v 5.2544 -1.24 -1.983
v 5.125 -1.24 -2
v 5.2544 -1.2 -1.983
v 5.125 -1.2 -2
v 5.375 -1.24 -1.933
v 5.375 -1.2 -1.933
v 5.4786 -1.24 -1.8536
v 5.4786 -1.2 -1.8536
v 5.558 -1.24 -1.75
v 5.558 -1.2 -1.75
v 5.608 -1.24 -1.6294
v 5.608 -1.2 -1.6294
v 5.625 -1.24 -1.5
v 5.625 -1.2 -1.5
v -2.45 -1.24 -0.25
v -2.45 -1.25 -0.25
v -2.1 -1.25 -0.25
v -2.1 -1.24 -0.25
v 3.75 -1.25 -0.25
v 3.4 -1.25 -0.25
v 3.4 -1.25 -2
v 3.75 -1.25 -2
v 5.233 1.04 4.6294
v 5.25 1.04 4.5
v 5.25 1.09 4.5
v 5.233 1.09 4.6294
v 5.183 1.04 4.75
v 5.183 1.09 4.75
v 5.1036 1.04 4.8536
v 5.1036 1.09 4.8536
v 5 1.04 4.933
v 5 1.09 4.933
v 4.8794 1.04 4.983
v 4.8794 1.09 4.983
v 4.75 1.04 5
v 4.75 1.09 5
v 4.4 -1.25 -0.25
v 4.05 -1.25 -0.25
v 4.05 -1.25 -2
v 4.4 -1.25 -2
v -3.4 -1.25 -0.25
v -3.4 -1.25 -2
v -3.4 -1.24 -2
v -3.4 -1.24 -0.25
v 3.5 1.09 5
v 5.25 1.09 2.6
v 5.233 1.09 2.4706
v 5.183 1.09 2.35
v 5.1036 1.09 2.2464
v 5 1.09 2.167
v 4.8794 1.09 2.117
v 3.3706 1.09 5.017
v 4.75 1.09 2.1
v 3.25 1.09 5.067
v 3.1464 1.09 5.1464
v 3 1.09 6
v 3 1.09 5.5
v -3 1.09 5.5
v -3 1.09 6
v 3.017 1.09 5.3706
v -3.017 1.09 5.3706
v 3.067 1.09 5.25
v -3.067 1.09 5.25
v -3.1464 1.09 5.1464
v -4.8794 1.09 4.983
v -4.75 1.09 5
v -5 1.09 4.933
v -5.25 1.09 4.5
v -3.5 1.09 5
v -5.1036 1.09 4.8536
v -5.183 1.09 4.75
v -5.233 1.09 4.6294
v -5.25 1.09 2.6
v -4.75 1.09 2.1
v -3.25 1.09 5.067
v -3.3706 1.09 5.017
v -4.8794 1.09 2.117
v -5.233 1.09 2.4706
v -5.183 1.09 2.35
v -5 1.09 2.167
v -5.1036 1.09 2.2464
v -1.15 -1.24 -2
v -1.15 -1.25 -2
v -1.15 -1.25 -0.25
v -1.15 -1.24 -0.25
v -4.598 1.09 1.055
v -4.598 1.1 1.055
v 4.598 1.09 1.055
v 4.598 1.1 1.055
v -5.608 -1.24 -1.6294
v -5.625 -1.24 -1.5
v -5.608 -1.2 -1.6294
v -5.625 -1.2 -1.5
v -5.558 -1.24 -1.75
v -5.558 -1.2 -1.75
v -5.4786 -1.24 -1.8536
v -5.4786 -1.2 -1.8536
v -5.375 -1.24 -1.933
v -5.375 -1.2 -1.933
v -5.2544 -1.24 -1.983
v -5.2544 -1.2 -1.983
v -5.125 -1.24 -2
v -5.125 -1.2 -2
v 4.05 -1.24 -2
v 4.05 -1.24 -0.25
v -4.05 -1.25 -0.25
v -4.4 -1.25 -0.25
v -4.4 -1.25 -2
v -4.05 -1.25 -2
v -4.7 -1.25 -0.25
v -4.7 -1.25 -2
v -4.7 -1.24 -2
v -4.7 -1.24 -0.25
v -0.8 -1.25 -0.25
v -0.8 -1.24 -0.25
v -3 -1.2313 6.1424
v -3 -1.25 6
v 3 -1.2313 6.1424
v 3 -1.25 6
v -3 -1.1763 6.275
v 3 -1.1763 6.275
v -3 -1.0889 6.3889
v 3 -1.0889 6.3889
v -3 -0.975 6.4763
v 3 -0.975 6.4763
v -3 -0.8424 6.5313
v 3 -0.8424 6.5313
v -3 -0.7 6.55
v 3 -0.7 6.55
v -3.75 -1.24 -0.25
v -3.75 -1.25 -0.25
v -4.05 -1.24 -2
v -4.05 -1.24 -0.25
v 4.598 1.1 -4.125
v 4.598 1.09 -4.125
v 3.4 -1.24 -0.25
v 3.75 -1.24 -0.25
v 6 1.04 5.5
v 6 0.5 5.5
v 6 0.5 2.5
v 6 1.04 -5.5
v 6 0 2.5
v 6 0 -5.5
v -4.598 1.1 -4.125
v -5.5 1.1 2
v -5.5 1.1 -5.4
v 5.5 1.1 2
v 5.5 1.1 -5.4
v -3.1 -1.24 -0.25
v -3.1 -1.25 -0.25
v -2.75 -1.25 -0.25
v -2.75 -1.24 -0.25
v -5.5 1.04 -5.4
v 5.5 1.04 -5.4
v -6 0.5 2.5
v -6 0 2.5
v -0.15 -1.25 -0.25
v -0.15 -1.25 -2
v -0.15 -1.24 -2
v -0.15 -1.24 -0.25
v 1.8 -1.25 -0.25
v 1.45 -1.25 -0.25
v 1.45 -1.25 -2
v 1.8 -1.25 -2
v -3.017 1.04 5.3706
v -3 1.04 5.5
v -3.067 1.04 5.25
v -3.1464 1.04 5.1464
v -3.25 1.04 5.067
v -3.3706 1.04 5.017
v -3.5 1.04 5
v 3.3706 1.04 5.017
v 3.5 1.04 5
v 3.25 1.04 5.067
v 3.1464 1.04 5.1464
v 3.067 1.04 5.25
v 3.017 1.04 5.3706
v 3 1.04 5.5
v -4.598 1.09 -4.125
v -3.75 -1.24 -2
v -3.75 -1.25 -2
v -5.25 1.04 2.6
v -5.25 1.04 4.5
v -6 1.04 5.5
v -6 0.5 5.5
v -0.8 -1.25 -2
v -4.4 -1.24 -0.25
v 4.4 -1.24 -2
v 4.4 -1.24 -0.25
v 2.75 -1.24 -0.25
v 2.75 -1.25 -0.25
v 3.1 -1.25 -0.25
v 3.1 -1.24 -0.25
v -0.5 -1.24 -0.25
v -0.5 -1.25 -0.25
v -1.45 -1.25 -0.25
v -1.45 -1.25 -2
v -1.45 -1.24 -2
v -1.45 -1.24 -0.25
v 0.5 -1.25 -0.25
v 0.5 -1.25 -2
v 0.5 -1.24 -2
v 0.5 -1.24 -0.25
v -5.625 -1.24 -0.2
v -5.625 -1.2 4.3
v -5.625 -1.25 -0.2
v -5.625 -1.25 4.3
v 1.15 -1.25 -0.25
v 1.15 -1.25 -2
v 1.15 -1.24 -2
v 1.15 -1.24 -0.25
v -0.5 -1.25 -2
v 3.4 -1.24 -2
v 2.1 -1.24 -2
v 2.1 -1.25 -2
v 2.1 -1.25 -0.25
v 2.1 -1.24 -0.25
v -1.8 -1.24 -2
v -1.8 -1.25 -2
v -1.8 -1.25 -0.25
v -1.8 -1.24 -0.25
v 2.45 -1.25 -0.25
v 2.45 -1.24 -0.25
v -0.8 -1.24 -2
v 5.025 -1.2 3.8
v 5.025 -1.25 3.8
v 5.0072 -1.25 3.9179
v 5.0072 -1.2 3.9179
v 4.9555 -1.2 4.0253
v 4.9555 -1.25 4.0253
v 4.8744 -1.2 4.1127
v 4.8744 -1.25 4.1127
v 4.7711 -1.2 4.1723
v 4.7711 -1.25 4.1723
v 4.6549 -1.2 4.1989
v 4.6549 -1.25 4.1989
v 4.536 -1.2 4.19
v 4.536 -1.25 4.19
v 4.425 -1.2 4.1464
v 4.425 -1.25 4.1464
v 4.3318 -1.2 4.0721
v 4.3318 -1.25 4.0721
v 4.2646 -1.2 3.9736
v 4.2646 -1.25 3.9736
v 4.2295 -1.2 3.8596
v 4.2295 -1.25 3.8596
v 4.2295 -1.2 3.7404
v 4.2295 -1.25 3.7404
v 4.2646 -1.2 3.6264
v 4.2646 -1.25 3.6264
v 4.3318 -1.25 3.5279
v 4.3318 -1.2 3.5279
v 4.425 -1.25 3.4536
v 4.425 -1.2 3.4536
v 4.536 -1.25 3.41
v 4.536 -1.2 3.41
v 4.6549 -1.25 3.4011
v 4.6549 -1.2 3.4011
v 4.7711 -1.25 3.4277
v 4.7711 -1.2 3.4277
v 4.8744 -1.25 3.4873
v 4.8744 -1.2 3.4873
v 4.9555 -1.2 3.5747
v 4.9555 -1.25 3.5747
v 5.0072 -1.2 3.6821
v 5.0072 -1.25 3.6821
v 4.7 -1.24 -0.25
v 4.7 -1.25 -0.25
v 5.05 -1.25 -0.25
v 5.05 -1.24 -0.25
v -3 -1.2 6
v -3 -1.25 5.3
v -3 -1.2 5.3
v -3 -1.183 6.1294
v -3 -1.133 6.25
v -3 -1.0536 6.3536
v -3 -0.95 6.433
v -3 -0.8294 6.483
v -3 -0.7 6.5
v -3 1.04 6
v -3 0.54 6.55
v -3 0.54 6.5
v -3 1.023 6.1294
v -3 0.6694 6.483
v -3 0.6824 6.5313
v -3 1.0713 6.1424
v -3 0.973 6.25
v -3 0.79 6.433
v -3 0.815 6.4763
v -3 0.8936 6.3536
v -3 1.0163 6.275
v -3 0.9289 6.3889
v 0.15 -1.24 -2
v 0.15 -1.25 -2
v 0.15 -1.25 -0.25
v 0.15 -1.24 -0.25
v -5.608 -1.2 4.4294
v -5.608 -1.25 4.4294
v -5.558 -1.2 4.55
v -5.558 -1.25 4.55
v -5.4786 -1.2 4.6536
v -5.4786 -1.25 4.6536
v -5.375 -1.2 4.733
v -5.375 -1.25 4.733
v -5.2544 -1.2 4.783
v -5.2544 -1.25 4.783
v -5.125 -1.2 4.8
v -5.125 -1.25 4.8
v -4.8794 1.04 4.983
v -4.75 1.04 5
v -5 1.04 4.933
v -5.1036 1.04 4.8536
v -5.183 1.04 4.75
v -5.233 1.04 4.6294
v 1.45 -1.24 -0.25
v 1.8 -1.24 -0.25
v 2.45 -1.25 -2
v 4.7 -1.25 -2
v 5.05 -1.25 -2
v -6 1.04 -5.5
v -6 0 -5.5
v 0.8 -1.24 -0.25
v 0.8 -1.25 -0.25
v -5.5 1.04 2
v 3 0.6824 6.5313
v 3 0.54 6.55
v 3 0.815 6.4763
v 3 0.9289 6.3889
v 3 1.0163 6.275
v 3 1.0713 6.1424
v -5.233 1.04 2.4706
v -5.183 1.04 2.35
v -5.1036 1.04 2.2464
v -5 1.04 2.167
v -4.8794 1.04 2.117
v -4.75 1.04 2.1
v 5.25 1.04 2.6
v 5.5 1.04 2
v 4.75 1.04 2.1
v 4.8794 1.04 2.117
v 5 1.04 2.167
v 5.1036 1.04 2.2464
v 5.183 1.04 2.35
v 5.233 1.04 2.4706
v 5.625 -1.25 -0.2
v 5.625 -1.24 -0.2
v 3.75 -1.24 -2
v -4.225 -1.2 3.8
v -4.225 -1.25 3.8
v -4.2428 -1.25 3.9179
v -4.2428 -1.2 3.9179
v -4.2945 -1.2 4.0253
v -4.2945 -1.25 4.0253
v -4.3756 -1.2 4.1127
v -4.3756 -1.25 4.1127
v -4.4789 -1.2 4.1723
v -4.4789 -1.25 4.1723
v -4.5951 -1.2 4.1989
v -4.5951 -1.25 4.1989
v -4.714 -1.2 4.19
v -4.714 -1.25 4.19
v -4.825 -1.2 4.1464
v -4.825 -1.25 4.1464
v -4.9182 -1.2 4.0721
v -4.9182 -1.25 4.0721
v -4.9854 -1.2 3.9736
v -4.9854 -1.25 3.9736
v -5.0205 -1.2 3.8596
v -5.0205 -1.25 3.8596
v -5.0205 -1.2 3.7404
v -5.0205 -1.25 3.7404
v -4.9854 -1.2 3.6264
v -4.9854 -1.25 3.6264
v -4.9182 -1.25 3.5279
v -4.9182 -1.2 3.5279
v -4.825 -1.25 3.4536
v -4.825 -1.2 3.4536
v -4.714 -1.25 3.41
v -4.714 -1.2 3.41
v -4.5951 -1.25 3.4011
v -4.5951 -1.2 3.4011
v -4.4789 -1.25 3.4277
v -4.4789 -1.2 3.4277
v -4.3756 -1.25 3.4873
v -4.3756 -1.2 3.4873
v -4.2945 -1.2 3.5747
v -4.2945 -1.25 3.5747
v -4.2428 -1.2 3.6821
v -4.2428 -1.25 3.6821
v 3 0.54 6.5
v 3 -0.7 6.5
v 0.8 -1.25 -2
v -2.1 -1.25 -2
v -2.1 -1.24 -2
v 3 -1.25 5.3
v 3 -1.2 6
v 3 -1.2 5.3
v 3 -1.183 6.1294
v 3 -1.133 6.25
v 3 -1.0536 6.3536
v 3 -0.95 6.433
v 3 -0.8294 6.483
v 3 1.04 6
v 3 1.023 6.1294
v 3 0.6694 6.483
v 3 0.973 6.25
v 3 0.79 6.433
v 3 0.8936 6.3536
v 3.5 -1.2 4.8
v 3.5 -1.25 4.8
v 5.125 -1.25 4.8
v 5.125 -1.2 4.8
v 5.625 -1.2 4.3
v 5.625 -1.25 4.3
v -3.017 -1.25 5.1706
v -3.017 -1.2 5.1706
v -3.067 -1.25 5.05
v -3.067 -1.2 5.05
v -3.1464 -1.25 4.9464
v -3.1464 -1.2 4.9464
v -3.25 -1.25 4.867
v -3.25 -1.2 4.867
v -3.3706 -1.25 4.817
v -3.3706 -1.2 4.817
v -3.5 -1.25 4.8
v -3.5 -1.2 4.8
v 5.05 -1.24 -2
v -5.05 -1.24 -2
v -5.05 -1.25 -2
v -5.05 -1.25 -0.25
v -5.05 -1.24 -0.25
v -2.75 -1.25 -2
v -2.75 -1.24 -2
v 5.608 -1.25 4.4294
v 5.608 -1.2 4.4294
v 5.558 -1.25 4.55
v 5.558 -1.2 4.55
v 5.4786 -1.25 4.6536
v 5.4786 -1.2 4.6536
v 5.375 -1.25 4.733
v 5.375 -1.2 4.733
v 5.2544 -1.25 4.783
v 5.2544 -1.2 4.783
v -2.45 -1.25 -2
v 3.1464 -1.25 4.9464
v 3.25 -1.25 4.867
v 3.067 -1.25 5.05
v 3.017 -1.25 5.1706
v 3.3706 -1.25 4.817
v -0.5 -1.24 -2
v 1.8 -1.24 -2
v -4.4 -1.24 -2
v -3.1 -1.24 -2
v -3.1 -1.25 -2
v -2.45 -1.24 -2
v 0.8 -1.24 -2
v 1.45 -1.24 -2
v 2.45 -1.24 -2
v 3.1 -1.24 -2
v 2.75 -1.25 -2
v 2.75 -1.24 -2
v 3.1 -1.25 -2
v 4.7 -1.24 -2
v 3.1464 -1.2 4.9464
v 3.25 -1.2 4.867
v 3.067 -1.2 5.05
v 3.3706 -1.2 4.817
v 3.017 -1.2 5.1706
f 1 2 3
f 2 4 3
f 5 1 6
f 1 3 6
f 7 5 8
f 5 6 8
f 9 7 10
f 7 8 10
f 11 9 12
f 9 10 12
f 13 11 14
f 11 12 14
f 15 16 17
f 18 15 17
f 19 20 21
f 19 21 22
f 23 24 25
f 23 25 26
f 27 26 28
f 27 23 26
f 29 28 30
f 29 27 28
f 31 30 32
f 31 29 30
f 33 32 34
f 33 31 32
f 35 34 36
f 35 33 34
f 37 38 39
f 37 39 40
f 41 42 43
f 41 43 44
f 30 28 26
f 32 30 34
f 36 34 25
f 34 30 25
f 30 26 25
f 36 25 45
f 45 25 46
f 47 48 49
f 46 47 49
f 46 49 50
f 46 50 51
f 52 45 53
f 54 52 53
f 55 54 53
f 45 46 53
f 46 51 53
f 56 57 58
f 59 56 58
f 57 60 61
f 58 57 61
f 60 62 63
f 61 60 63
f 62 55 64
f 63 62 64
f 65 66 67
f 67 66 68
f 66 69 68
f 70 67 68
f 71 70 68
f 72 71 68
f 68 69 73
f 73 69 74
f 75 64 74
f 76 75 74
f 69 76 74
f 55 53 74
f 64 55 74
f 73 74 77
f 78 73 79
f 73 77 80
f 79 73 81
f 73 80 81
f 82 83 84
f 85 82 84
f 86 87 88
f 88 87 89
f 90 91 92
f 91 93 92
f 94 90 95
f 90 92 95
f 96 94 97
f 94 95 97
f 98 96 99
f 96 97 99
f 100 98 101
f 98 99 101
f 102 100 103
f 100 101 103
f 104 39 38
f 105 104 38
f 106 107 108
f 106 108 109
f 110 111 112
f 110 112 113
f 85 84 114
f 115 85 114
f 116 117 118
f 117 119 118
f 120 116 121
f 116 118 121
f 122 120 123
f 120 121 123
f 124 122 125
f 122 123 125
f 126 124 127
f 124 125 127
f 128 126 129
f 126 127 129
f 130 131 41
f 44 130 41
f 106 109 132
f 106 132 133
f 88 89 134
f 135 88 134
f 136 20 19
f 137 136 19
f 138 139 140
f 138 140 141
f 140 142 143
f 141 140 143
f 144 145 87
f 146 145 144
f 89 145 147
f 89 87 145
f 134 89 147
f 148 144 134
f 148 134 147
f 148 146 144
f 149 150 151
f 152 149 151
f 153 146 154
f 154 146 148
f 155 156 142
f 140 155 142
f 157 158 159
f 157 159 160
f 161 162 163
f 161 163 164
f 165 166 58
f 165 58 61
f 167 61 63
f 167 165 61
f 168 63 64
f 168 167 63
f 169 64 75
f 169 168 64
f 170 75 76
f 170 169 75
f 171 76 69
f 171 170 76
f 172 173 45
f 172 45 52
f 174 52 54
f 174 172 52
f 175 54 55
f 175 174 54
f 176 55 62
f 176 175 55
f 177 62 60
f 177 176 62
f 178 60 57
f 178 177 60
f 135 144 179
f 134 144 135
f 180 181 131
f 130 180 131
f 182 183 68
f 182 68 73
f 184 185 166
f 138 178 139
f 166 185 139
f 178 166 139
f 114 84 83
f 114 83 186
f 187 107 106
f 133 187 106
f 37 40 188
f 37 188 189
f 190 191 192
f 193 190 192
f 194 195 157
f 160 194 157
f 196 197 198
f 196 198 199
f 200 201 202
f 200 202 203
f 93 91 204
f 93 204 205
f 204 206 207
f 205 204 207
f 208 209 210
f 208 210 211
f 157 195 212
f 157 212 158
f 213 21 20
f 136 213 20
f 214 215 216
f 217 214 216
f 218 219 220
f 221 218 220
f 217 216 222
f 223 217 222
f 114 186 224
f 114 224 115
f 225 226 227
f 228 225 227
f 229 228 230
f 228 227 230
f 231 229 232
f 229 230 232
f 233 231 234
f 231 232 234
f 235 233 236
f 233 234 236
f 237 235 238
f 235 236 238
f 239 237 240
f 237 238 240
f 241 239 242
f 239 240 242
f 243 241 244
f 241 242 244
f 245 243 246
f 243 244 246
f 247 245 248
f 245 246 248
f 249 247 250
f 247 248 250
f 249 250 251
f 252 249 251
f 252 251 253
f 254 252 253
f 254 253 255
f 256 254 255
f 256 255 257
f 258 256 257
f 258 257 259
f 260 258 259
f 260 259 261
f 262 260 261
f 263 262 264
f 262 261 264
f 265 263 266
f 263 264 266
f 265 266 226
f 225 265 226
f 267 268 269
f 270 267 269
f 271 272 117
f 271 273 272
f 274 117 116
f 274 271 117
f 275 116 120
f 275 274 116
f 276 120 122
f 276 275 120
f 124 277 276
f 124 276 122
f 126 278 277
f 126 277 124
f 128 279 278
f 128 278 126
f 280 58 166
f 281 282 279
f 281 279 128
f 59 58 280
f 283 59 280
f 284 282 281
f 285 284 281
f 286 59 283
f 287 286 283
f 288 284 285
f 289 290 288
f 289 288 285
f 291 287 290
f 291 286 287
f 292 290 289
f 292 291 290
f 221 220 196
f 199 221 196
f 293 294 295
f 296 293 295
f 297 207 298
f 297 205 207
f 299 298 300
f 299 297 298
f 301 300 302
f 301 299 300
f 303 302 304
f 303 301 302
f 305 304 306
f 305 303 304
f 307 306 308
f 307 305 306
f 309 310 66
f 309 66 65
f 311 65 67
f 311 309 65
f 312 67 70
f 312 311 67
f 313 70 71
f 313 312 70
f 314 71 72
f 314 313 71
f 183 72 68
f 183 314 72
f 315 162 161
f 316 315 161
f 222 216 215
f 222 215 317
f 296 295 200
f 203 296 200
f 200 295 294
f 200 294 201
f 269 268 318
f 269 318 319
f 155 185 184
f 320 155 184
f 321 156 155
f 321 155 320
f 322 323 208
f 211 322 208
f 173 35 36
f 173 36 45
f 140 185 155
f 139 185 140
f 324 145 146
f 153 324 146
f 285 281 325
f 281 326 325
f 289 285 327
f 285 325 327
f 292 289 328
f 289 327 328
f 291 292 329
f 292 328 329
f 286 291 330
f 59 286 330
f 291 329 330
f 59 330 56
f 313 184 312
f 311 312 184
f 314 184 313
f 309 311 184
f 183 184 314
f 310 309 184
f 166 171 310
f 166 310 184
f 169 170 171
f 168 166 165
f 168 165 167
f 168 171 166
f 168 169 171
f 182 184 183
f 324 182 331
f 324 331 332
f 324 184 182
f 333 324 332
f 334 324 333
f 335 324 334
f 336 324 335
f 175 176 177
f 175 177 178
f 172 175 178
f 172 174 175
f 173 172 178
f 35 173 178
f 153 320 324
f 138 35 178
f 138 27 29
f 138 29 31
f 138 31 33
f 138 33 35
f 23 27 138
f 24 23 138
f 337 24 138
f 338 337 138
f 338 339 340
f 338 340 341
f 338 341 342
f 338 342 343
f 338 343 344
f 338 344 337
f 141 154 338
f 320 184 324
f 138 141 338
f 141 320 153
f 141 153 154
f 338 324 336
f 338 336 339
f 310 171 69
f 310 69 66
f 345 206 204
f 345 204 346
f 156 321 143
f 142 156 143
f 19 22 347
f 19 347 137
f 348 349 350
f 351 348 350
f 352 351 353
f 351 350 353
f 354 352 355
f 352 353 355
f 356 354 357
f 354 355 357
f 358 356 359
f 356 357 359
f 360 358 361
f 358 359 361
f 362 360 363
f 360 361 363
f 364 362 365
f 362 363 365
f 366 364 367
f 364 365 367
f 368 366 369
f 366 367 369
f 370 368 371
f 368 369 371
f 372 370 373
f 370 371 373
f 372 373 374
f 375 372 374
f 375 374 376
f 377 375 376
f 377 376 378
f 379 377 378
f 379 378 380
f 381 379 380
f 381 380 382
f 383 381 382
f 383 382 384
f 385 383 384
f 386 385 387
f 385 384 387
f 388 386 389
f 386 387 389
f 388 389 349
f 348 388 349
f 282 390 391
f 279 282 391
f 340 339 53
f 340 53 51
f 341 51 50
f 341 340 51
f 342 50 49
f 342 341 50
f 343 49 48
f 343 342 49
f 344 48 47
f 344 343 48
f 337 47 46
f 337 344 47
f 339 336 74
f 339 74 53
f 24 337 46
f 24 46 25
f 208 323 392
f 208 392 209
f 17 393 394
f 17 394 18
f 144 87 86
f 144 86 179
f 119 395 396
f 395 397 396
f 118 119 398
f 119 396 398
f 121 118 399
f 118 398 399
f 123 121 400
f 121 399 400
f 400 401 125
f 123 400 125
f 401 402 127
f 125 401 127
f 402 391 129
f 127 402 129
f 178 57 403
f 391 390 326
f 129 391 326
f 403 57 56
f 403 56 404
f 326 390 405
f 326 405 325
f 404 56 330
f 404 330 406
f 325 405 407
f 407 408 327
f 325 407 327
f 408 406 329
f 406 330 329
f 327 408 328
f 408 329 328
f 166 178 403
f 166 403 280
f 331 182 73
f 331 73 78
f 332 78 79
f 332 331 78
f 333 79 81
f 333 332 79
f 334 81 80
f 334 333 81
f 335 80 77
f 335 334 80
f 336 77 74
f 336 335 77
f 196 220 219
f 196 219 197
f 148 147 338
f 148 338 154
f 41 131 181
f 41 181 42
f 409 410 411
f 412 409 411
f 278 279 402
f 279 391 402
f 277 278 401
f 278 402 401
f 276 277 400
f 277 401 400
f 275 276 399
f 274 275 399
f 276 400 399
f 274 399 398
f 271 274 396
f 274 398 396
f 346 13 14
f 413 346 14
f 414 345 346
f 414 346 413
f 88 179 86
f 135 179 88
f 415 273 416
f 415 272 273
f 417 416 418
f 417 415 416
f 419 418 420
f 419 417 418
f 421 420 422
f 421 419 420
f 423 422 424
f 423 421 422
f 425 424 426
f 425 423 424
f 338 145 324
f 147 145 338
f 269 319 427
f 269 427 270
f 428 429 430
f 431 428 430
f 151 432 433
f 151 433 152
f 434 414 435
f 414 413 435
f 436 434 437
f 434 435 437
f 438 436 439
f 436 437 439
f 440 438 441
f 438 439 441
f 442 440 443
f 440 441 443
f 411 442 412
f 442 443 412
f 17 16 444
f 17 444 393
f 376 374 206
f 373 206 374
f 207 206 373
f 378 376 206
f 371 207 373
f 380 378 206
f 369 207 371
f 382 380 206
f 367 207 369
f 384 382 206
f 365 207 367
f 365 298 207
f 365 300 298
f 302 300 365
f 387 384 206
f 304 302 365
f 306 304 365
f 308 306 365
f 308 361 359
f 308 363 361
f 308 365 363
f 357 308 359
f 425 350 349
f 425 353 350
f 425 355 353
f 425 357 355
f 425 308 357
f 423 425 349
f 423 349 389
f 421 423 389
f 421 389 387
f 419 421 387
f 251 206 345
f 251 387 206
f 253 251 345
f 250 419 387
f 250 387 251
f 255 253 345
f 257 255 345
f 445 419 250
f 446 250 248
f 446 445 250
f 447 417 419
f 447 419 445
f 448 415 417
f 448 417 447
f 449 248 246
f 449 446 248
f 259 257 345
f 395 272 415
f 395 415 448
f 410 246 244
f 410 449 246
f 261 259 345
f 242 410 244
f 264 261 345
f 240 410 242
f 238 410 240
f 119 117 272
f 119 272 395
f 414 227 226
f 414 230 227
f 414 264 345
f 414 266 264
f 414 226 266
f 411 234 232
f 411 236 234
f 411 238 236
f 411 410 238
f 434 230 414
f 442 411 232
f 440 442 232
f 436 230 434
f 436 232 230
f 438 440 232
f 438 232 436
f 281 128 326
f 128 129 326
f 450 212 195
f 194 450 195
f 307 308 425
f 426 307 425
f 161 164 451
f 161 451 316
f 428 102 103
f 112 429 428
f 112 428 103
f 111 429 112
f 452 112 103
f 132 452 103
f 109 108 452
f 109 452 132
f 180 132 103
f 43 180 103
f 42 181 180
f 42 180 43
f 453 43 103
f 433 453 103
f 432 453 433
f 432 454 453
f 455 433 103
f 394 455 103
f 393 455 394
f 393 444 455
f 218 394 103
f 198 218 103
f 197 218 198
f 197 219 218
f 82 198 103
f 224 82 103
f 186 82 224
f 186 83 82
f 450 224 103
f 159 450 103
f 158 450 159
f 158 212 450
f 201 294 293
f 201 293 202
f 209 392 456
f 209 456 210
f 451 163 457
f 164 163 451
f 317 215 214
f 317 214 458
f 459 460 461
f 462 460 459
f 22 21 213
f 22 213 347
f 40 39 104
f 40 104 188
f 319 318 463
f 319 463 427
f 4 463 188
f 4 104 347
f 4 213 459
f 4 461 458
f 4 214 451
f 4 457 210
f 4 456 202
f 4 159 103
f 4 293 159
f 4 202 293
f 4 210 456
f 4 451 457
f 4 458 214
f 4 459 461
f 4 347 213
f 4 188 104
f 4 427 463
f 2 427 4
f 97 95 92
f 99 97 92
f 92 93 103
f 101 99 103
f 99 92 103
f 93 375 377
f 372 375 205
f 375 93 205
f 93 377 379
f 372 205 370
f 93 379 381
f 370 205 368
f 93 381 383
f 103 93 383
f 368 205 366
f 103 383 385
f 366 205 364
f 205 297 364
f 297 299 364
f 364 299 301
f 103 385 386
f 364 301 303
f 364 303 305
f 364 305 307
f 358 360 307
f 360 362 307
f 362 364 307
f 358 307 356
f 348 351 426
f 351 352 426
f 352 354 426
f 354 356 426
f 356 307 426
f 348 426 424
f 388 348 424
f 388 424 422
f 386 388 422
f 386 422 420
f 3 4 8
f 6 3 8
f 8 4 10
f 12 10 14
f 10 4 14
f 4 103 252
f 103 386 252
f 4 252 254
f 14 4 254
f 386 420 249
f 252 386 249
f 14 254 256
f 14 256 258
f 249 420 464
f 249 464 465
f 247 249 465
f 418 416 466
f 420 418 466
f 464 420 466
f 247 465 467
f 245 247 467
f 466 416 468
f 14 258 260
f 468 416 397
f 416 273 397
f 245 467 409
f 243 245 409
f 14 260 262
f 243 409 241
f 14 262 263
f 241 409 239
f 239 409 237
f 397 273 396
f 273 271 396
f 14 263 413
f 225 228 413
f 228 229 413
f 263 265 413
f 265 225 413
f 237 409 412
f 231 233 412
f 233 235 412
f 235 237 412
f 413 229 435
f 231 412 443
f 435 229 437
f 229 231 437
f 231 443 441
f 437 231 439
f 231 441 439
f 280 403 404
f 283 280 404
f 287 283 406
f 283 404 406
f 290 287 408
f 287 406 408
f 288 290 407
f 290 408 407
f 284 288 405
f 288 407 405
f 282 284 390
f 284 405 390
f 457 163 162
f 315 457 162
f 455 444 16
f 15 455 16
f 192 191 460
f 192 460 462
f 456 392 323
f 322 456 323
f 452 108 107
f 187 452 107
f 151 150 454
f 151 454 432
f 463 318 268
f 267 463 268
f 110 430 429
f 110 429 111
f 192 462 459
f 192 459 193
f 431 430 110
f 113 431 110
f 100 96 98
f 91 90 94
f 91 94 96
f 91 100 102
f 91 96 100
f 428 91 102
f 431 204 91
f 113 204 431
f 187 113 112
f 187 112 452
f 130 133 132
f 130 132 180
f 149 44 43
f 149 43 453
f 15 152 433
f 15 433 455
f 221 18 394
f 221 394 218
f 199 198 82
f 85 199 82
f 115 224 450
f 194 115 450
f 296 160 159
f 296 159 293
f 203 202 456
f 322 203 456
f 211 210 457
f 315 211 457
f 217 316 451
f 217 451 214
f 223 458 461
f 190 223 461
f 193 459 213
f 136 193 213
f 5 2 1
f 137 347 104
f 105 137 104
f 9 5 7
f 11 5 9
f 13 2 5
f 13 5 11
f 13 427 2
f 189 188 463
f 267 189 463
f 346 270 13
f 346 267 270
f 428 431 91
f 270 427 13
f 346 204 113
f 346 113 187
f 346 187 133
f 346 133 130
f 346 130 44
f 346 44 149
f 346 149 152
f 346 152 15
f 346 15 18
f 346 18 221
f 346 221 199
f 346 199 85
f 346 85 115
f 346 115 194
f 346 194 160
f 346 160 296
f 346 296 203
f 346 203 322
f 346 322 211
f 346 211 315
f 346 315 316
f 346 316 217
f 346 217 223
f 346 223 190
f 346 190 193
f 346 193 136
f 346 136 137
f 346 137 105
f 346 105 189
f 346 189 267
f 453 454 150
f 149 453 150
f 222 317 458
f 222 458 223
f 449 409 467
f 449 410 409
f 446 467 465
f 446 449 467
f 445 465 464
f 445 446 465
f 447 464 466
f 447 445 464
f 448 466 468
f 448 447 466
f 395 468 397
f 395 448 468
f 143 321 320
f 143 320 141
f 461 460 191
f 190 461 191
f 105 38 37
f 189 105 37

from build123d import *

# Parameters (mm, degrees)
SKETCH1_W           = 12
SKETCH1_H           = 11
BOSS_EXTRUDE1_DEPTH = 1.1
SKETCH2_W           = 12
SKETCH2_H           = 11
SKETCH2_W_2         = 11
SKETCH2_H_2         = 7.4
CUT_EXTRUDE1_DEPTH  = 0.06
SKETCH3_W           = 9.196
SKETCH3_H           = 5.18
CUT_EXTRUDE2_DEPTH  = 0.01
SKETCH4_W           = 12
SKETCH4_H           = 3
CUT_EXTRUDE3_DEPTH  = 0.5
BOSS_EXTRUDE2_DEPTH = 0.05
BOSS_EXTRUDE3_DEPTH = 3
SKETCH7_W           = 11.25
SKETCH7_H           = 6.8
SKETCH7_R           = 0.4
BOSS_EXTRUDE4_DEPTH = 0.05
SKETCH8_W           = 0.3
SKETCH8_H           = 1.8
SKETCH8_W_2         = 0.575
CUT_EXTRUDE4_DEPTH  = 0.01
SKETCH10_W          = 10.1
SKETCH10_H          = 0.05
CUT_EXTRUDE5_DEPTH  = 0.01
FILLET1_R           = 0.5


with BuildPart() as part:
    # Sketch1 → Boss-Extrude1 (new body)
    with BuildSketch(Plane(origin=(0, 0, 0), x_dir=(1, 0, 0), z_dir=(0, 1, 0))):
        Rectangle(SKETCH1_W, SKETCH1_H)
    extrude(amount=BOSS_EXTRUDE1_DEPTH)

    # Sketch2 → Cut-Extrude1 (cut)
    with BuildSketch(Plane(origin=(0, 1.1, 0), x_dir=(1, 0, 0), z_dir=(0, 1, 0))):
        Rectangle(SKETCH2_W, SKETCH2_H)
        with Locations((0, 1.7)):
            Rectangle(SKETCH2_W_2, SKETCH2_H_2, mode=Mode.SUBTRACT)
    extrude(amount=-CUT_EXTRUDE1_DEPTH, mode=Mode.SUBTRACT)

    # Sketch3 → Cut-Extrude2 (cut)
    with BuildSketch(Plane(origin=(0, 1.1, 0), x_dir=(1, 0, 0), z_dir=(0, 1, 0))):
        with Locations((0, 1.535)):
            Rectangle(SKETCH3_W, SKETCH3_H)
    extrude(amount=-CUT_EXTRUDE2_DEPTH, mode=Mode.SUBTRACT)

    # Sketch4 → Cut-Extrude3 (cut)
    with BuildSketch(Plane.XZ):
        with Locations((0, 4)):
            Rectangle(SKETCH4_W, SKETCH4_H)
    extrude(amount=-CUT_EXTRUDE3_DEPTH, mode=Mode.SUBTRACT)

    # Sketch5 → Boss-Extrude2 (add)
    with BuildSketch(Plane(origin=(0, 1.04, 0), x_dir=(1, 0, 0), z_dir=(0, 1, 0))):
        with BuildLine():
            Line((-4.75, -2.1), (4.75, -2.1))
            ThreePointArc((4.75, -2.1), (5.103553391, -2.246446609), (5.25, -2.6))
            Line((5.25, -2.6), (5.25, -4.5))
            ThreePointArc((5.25, -4.5), (5.103553391, -4.853553391), (4.75, -5))
            Line((4.75, -5), (3.5, -5))
            ThreePointArc((3.5, -5), (3.146446609, -5.146446609), (3, -5.5))
            Line((3, -5.5), (3, -6))
            Line((3, -6), (-3, -6))
            Line((-3, -6), (-3, -5.5))
            ThreePointArc((-3, -5.5), (-3.146446609, -5.146446609), (-3.5, -5))
            Line((-3.5, -5), (-4.75, -5))
            ThreePointArc((-4.75, -5), (-5.103553391, -4.853553391), (-5.25, -4.5))
            Line((-5.25, -4.5), (-5.25, -2.6))
            ThreePointArc((-5.25, -2.6), (-5.103553391, -2.246446609), (-4.75, -2.1))
        make_face()
    extrude(amount=BOSS_EXTRUDE2_DEPTH)

    # Sketch6 → Boss-Extrude3 (add, symmetric)
    with BuildSketch(Plane(origin=(0, 0, 0), x_dir=(0, 0, -1), z_dir=(1, 0, 0))):
        with BuildLine():
            Line((-6.5, 0.54), (-6.5, -0.7))
            ThreePointArc((-6.5, -0.7), (-6.353553391, -1.053553391), (-6, -1.2))
            Line((-6, -1.2), (2, -1.2))
            Line((2, -1.2), (2, -1.25))
            Line((2, -1.25), (-6, -1.25))
            ThreePointArc((-6, -1.25), (-6.38890873, -1.08890873), (-6.55, -0.7))
            Line((-6.55, -0.7), (-6.55, 0.54))
            ThreePointArc((-6.55, 0.54), (-6.38890873, 0.92890873), (-6, 1.09))
            Line((-6, 1.09), (-6, 1.04))
            ThreePointArc((-6, 1.04), (-6.353553391, 0.893553391), (-6.5, 0.54))
        make_face()
    extrude(amount=BOSS_EXTRUDE3_DEPTH, both=True)

    # Sketch7 → Boss-Extrude4 (add)
    with BuildSketch(Plane.XZ.offset(1.25)):
        with Locations((0, 1.4)):
            Rectangle(SKETCH7_W, SKETCH7_H)
        with Locations((-4.625, 3.8)):
            Circle(SKETCH7_R, mode=Mode.SUBTRACT)
        with Locations((4.625, 3.8)):
            Circle(SKETCH7_R, mode=Mode.SUBTRACT)
    extrude(amount=-BOSS_EXTRUDE4_DEPTH)

    # Sketch8 → Cut-Extrude4 (cut)
    with BuildSketch(Plane.XZ.offset(1.25)):
        with Locations((0, -1.1)):
            Rectangle(SKETCH8_W, SKETCH8_H)
        with Locations((0.65, -1.1)):
            Rectangle(SKETCH8_W, SKETCH8_H)
        with Locations((1.3, -1.1)):
            Rectangle(SKETCH8_W, SKETCH8_H)
        with Locations((1.95, -1.1)):
            Rectangle(SKETCH8_W, SKETCH8_H)
        with Locations((2.6, -1.1)):
            Rectangle(SKETCH8_W, SKETCH8_H)
        with Locations((3.25, -1.1)):
            Rectangle(SKETCH8_W, SKETCH8_H)
        with Locations((3.9, -1.1)):
            Rectangle(SKETCH8_W, SKETCH8_H)
        with Locations((4.55, -1.1)):
            Rectangle(SKETCH8_W, SKETCH8_H)
        with Locations((-4.55, -1.1)):
            Rectangle(SKETCH8_W, SKETCH8_H)
        with Locations((-3.9, -1.1)):
            Rectangle(SKETCH8_W, SKETCH8_H)
        with Locations((-3.25, -1.1)):
            Rectangle(SKETCH8_W, SKETCH8_H)
        with Locations((-2.6, -1.1)):
            Rectangle(SKETCH8_W, SKETCH8_H)
        with Locations((-1.95, -1.1)):
            Rectangle(SKETCH8_W, SKETCH8_H)
        with Locations((-1.3, -1.1)):
            Rectangle(SKETCH8_W, SKETCH8_H)
        with Locations((-0.65, -1.1)):
            Rectangle(SKETCH8_W, SKETCH8_H)
        with Locations((5.3375, -1.1)):
            Rectangle(SKETCH8_W_2, SKETCH8_H)
        with Locations((-5.3375, -1.1)):
            Rectangle(SKETCH8_W_2, SKETCH8_H)
    extrude(amount=-CUT_EXTRUDE4_DEPTH, mode=Mode.SUBTRACT)

    # Sketch10 → Cut-Extrude5 (cut)
    with BuildSketch(Plane.XZ.offset(1.25)):
        with Locations((0, -0.225)):
            Rectangle(SKETCH10_W, SKETCH10_H)
    extrude(amount=-CUT_EXTRUDE5_DEPTH, mode=Mode.SUBTRACT)

    # Fillet1
    fillet1_edges = [part.edges().sort_by_distance(p)[0] for p in [
        (5.625, -1.22, -2),
        (-5.625, -1.225, 4.8),
        (5.625, -1.225, 4.8),
        (3, -1.225, 4.8),
        (-3, -1.225, 4.8),
        (-5.625, -1.22, -2),
    ]]
    fillet(fillet1_edges, radius=FILLET1_R)


solid = part.part
